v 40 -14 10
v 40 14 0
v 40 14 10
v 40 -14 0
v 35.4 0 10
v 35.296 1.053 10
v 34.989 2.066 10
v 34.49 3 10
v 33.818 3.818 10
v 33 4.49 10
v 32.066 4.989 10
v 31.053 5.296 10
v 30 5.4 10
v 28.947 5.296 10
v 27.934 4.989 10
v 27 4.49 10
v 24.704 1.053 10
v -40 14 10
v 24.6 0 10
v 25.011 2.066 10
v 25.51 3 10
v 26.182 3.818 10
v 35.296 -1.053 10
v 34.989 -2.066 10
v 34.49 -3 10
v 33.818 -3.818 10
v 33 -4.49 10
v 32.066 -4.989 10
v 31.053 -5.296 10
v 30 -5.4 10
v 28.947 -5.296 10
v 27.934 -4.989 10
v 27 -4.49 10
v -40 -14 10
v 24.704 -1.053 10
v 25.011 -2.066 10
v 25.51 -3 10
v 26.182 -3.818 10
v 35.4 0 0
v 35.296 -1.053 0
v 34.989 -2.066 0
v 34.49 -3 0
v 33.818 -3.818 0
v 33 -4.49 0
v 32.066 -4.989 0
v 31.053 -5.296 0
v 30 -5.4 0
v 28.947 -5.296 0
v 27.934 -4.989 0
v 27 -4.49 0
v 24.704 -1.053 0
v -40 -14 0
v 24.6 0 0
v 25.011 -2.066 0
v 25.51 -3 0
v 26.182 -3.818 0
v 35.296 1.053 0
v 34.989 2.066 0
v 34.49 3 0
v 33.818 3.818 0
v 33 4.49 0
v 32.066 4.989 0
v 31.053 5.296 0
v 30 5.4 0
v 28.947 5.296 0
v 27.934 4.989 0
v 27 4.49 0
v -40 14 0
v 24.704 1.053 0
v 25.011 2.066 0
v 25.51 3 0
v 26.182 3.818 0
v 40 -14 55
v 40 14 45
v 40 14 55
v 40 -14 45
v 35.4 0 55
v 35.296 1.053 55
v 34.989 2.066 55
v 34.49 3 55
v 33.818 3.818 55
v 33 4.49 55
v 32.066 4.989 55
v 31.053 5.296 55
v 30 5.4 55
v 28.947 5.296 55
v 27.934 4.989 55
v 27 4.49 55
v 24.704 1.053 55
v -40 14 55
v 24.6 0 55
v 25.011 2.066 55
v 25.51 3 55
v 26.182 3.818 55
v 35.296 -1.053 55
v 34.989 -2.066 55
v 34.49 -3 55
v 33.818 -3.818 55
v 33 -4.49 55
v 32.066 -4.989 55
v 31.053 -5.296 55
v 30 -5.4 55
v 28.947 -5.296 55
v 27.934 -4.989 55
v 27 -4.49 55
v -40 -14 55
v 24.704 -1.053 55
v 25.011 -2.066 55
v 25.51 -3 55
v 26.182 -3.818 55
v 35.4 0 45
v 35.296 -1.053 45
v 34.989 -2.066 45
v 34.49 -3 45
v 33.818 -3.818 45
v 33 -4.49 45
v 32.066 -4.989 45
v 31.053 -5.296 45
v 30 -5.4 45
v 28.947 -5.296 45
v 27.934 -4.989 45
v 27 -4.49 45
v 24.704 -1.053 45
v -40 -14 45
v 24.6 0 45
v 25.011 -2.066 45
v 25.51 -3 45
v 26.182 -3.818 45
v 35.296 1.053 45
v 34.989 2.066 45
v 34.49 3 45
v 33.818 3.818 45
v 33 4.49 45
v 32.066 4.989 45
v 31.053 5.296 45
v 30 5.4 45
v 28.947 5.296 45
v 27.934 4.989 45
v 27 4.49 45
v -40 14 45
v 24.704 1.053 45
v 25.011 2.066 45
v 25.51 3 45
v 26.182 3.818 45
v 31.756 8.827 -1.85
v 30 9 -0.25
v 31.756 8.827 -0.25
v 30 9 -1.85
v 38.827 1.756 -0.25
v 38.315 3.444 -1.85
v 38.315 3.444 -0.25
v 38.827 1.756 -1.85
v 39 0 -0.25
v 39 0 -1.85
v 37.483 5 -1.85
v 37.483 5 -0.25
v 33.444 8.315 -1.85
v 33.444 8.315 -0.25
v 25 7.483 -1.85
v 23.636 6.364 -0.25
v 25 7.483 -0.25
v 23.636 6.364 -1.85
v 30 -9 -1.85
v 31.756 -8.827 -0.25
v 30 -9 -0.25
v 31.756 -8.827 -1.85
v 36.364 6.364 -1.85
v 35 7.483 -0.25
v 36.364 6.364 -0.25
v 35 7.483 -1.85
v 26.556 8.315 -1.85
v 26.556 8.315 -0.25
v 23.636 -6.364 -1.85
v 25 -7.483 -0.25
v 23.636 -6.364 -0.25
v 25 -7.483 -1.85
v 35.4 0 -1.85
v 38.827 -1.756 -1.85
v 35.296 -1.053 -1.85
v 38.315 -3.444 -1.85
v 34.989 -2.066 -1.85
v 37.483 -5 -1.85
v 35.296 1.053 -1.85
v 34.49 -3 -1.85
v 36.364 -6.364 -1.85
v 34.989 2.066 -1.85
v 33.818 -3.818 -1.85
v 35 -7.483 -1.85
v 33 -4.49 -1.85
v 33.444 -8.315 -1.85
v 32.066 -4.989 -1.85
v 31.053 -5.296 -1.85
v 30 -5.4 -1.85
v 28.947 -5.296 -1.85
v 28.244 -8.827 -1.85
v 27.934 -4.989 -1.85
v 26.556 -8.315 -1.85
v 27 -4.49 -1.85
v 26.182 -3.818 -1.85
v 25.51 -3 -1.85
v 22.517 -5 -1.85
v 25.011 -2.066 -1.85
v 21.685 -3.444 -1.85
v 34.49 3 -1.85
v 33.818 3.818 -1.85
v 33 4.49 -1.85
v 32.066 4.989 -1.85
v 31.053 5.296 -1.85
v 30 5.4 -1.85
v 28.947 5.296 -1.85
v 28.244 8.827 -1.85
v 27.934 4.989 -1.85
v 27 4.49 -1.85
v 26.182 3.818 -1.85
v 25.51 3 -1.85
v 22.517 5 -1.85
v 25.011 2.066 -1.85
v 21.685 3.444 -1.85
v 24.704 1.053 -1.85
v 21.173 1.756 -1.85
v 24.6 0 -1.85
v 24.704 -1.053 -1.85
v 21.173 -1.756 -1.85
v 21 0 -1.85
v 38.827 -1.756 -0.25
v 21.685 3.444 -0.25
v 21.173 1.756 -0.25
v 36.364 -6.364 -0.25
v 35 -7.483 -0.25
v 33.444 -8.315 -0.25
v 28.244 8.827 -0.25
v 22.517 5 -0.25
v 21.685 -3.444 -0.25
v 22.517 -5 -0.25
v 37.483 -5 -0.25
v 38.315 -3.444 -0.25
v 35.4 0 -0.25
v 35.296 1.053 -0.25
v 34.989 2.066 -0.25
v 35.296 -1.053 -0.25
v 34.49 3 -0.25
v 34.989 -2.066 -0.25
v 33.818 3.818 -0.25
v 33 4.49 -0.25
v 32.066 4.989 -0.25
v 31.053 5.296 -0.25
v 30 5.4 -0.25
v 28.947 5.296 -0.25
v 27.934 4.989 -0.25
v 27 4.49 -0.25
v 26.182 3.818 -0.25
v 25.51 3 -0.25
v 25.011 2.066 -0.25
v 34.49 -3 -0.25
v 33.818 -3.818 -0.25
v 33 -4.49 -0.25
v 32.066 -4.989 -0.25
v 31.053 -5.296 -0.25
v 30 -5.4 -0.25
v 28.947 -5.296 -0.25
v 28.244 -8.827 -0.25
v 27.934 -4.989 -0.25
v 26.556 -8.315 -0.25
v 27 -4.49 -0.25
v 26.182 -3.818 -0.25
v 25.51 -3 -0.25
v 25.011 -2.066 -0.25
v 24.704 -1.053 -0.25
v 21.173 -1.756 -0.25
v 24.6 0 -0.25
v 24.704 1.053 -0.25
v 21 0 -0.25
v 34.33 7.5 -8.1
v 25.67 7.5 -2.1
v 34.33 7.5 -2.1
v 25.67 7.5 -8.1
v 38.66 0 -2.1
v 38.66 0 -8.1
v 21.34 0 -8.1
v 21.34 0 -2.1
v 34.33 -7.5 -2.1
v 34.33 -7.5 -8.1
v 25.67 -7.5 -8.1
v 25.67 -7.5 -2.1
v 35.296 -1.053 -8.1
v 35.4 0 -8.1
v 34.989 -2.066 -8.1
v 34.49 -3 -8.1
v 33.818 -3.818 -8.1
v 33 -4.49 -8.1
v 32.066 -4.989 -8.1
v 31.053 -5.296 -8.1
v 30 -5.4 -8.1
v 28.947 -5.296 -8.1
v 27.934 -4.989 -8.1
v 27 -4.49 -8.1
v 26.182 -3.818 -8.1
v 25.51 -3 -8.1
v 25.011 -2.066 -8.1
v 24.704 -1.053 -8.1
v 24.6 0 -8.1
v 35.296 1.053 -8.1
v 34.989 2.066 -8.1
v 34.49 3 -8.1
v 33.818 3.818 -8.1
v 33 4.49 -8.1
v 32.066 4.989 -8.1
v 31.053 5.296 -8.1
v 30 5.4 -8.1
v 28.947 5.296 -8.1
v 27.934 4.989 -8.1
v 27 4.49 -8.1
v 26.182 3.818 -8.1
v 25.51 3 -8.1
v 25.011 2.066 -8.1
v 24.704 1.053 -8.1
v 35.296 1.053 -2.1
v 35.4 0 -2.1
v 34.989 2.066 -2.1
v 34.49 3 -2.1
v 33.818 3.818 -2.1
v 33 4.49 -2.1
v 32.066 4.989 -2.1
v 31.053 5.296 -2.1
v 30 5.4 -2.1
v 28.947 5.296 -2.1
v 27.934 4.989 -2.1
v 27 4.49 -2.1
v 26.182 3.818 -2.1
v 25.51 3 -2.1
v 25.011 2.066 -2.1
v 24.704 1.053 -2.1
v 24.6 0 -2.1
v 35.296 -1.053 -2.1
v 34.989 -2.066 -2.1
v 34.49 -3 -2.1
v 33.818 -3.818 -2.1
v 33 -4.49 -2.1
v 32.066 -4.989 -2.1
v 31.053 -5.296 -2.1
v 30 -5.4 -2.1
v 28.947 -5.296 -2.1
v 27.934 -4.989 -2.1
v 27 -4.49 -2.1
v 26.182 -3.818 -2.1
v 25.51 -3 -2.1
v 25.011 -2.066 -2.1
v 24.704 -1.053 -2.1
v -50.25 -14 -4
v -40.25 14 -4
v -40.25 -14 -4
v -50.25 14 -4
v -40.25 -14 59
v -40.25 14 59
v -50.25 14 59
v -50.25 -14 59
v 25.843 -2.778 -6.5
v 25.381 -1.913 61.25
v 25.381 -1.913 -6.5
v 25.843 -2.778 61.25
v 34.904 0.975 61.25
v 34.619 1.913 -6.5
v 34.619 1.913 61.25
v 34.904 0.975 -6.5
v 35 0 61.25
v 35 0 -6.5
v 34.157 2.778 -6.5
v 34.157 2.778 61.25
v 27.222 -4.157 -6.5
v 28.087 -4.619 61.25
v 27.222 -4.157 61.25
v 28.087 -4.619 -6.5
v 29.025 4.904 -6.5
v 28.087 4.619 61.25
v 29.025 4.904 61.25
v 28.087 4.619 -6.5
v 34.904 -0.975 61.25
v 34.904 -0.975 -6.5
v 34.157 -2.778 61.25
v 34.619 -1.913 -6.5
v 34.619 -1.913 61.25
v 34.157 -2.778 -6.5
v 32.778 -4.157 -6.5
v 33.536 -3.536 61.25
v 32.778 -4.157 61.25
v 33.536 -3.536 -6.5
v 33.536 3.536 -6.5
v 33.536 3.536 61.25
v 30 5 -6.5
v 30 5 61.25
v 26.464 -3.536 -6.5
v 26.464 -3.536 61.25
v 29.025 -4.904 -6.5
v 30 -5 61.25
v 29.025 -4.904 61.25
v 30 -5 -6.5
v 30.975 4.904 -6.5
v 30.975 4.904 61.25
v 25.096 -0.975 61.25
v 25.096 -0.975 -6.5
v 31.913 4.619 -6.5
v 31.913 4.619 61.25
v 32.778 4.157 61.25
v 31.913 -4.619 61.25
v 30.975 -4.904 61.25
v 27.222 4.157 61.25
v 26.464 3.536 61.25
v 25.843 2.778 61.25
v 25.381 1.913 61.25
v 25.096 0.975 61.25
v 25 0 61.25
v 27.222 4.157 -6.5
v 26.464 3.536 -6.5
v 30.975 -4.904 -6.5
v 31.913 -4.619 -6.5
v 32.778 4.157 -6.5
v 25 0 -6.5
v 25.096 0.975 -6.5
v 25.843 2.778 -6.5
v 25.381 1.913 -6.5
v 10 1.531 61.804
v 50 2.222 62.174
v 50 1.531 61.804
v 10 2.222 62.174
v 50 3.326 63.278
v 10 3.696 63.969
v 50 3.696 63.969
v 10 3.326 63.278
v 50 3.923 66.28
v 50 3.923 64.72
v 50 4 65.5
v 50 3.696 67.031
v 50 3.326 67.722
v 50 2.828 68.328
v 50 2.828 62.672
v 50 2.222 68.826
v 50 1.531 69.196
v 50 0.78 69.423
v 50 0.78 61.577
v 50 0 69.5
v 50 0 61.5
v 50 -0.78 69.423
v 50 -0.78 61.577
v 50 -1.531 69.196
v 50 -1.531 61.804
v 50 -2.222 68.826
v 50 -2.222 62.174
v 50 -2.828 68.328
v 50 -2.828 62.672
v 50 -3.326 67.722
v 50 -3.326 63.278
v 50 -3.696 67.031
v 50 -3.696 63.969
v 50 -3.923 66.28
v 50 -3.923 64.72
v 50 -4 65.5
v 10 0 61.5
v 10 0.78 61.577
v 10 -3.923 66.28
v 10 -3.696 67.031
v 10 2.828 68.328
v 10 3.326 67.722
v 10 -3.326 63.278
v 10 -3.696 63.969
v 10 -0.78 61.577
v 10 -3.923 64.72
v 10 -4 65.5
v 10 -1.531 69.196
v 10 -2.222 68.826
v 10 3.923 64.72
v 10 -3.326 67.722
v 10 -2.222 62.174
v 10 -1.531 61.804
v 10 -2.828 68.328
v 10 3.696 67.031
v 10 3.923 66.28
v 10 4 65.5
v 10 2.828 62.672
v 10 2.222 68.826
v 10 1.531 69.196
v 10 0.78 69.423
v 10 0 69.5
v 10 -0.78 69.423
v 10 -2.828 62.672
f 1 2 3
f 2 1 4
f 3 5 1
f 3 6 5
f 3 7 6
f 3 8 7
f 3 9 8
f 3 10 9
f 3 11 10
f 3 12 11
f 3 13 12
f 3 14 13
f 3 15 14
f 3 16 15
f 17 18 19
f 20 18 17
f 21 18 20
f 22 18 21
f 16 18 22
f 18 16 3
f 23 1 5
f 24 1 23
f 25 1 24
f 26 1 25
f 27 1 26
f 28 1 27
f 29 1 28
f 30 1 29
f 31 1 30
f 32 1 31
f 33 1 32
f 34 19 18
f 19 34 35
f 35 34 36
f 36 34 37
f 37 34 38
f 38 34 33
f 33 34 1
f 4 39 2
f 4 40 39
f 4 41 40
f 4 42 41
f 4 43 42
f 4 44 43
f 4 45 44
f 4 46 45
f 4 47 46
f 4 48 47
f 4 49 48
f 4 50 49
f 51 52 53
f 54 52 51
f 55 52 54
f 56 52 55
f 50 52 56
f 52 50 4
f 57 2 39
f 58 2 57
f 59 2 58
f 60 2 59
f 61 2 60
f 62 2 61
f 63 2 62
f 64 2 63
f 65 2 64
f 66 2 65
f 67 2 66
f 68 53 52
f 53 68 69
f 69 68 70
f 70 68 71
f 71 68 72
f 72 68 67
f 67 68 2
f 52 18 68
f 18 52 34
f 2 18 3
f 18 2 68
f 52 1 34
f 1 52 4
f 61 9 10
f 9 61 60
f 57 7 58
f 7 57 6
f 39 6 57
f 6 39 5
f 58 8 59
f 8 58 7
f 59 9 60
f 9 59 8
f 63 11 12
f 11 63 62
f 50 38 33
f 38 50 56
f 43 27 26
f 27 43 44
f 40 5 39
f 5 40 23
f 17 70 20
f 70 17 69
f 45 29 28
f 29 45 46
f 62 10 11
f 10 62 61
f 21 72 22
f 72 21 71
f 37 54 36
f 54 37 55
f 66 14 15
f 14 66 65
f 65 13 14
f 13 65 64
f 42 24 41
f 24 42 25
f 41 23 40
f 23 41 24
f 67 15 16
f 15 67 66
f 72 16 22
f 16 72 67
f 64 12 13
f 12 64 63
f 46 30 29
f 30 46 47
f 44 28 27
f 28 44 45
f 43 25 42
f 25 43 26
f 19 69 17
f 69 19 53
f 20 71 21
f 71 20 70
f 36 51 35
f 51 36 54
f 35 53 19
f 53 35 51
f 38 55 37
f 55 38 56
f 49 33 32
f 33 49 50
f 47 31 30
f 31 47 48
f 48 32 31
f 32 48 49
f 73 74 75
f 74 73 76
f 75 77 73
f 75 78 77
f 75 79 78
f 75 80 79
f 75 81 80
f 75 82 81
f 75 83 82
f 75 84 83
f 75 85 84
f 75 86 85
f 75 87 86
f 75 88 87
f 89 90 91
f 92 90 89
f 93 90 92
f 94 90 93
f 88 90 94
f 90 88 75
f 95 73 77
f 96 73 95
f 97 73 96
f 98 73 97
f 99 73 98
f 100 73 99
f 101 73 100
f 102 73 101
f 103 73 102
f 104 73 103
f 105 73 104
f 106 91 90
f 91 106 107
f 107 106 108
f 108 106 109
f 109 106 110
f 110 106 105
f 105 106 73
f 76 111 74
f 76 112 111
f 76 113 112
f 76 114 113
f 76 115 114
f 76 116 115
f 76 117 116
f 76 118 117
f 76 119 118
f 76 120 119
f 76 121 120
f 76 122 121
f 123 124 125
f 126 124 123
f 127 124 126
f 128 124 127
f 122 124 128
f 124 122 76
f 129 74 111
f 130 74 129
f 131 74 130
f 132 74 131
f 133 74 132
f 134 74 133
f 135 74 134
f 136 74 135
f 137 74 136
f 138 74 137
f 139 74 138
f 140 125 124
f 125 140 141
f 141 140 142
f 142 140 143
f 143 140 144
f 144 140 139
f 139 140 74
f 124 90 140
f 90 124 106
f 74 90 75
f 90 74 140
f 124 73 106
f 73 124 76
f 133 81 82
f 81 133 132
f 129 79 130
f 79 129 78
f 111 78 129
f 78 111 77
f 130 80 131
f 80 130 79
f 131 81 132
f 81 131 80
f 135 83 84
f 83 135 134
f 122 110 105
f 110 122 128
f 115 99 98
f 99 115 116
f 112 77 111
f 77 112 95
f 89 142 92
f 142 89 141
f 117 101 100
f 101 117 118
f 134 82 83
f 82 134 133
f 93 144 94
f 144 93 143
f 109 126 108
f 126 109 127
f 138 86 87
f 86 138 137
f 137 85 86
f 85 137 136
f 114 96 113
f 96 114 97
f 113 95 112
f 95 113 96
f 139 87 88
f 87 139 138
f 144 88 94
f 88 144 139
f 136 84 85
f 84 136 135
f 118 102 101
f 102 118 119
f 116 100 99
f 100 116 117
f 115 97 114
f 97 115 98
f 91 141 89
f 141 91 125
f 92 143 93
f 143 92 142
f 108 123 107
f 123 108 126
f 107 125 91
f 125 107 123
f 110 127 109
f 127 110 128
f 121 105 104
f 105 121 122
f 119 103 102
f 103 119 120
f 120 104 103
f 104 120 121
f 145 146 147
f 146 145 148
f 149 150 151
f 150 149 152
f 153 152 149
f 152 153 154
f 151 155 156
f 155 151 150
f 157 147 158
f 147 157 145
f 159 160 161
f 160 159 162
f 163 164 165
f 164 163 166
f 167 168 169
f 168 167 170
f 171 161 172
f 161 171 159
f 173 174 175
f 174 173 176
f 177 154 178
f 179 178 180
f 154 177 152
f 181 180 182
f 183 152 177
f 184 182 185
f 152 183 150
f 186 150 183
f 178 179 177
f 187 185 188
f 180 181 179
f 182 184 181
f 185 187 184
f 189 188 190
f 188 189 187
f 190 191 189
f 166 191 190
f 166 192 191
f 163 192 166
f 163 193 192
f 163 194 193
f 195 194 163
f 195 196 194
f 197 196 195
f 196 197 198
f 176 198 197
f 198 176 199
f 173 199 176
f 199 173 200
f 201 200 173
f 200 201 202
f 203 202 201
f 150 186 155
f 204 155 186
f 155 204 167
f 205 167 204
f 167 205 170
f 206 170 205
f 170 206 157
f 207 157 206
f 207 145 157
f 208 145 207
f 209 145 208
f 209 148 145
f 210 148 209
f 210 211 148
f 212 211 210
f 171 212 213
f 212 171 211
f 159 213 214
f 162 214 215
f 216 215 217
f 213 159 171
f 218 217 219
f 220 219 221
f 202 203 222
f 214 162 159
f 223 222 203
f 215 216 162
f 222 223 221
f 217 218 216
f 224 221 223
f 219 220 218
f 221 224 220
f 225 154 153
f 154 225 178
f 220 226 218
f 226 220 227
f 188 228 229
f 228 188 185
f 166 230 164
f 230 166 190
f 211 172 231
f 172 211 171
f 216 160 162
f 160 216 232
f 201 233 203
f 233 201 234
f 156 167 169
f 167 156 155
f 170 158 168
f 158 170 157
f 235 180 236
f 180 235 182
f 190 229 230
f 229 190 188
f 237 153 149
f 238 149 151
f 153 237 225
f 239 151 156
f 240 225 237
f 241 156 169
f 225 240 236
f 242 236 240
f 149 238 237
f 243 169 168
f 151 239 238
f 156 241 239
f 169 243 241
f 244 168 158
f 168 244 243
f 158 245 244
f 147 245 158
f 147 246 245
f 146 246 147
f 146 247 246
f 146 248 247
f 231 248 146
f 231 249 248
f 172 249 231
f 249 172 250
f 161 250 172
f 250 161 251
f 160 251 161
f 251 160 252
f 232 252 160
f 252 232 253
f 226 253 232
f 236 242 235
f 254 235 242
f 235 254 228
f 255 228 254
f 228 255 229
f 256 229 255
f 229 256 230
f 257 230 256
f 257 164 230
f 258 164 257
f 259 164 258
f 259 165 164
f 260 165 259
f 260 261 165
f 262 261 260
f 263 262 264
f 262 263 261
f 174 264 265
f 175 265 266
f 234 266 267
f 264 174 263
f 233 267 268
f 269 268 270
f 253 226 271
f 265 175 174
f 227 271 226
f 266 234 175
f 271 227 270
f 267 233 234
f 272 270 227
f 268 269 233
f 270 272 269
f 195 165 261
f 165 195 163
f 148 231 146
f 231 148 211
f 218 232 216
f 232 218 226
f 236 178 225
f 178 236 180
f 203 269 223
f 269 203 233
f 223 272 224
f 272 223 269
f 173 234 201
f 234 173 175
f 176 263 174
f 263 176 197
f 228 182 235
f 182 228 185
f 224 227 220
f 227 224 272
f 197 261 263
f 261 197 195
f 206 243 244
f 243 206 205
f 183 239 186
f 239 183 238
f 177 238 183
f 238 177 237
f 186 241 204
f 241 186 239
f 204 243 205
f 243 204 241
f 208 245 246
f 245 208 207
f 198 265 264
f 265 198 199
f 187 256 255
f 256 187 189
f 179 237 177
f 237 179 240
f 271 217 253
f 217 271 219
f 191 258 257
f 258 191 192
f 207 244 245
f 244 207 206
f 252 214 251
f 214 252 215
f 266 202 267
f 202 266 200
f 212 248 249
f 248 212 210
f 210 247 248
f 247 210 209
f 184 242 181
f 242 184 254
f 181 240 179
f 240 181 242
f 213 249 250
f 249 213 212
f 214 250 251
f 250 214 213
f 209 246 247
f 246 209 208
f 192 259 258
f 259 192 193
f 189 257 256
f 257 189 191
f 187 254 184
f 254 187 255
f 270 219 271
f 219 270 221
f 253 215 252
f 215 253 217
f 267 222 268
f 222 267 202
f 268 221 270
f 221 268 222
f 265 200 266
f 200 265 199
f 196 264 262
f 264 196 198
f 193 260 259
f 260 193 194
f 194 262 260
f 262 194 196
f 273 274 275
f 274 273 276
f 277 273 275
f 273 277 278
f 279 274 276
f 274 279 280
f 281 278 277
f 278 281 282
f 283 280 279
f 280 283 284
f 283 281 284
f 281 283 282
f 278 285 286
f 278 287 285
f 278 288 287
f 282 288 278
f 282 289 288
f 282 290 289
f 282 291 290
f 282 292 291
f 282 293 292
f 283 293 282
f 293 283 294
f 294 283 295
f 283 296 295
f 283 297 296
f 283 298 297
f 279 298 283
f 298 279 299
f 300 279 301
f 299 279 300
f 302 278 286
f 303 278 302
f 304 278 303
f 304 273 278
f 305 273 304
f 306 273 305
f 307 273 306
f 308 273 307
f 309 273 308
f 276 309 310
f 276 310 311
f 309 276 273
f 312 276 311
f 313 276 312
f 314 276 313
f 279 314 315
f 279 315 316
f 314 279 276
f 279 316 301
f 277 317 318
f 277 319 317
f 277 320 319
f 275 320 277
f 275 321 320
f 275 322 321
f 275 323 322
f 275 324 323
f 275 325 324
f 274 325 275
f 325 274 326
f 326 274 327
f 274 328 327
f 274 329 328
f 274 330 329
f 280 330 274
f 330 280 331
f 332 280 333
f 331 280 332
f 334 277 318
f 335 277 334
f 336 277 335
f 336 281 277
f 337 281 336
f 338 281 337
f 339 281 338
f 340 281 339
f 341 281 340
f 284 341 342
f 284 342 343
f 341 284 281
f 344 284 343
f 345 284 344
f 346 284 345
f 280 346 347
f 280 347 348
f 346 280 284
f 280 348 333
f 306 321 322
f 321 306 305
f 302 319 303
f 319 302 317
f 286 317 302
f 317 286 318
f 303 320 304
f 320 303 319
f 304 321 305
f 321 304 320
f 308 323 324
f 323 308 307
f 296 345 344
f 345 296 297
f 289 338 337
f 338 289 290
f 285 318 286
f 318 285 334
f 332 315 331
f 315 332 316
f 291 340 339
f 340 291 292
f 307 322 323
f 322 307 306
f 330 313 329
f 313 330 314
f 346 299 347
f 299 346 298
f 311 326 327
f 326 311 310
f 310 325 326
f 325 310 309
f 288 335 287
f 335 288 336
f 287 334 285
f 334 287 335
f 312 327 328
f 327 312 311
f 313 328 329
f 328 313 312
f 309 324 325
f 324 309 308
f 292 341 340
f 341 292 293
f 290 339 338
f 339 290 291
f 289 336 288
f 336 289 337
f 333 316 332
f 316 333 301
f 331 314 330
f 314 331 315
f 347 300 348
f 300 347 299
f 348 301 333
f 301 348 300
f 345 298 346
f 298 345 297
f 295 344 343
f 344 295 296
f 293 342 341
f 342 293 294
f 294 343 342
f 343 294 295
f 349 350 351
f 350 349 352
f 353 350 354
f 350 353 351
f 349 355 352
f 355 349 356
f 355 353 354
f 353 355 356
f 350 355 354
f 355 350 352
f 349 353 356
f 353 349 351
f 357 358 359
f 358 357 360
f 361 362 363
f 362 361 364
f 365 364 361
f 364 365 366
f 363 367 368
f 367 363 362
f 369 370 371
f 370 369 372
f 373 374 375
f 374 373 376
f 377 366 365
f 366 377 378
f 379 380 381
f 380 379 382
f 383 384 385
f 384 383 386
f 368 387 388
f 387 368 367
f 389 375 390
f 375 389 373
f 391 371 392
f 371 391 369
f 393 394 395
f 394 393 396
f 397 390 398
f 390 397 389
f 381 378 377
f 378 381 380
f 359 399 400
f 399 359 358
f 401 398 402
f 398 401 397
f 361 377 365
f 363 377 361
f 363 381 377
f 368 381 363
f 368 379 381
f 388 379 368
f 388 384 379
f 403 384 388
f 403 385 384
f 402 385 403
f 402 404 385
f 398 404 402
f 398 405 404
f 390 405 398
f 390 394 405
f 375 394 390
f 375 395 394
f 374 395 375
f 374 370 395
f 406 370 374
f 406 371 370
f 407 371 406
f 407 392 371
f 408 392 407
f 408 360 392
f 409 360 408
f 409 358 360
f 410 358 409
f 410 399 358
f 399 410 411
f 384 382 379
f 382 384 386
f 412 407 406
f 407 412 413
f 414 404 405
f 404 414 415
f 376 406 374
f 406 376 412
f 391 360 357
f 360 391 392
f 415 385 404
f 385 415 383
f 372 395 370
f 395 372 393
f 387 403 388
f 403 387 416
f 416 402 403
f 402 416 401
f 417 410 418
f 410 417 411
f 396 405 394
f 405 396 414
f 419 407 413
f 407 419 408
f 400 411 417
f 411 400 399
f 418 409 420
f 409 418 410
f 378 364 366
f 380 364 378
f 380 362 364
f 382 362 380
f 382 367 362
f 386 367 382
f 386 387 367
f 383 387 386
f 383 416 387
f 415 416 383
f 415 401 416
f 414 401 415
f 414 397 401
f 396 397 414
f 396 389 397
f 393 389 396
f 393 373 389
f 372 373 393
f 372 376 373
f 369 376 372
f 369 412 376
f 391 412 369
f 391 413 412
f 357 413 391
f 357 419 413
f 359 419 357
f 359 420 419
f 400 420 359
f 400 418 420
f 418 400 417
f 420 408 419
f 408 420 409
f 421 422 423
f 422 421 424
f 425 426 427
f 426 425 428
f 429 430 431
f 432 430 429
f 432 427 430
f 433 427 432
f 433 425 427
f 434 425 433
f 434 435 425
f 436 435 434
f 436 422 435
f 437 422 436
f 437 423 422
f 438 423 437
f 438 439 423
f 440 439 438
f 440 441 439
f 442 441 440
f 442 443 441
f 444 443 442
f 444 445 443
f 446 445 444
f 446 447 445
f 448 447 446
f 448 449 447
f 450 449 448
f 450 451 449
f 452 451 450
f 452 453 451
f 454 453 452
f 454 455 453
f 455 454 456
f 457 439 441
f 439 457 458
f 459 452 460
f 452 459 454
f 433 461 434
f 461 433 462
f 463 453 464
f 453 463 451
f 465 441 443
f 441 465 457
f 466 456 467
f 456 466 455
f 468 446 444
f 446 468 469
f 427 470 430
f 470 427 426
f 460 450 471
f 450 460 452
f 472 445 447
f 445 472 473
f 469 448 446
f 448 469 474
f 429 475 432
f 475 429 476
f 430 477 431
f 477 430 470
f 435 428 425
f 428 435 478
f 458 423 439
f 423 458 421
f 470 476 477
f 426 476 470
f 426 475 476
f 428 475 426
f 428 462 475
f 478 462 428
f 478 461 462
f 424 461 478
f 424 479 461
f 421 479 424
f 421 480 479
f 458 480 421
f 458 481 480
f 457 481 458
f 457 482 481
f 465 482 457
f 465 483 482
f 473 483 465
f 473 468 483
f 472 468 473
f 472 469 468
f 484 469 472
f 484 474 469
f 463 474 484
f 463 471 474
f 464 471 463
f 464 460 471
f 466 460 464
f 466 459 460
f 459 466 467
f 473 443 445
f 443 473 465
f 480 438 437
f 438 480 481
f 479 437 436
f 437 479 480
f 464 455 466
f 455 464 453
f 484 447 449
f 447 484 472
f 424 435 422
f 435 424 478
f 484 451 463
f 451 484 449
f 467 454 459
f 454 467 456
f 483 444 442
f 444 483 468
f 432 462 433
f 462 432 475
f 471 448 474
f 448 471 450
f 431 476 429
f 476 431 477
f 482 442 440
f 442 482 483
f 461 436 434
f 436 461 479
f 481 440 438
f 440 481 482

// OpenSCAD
$fn = 32;

// ------------------------------------------------------------------------
// C clamp: throat 45 mm, screw d10
// Every part is its own module, assembly() places every instance.
// ------------------------------------------------------------------------

// --- part 1 ---
module clamp_arm() {
  difference() {
    translate([-40, -14, 0]) cube([80, 28, 10]);
    translate([30, 0, -1]) cylinder(h = 12, d = 10.8);
  }
}

// --- part 2 ---
module clamp_spine() {
  difference() {
    translate([-31.5, -14, 0]) cube([63, 28, 10]);
  }
}

// --- part 3 ---
module clamp_screw() {
  translate([0, 0, -33.875]) cylinder(h = 67.75, d = 10);
}

// --- part 4 ---
module clamp_washer() {
  difference() {
      translate([0, 0, 0]) cylinder(h = 1.6, d = 18);
      translate([0, 0, -1]) cylinder(h = 3.6, d = 10.8);
    }
}

// --- part 5 ---
module clamp_nut() {
  difference() {
    linear_extrude(height = 6) polygon(points = [[8.66, 0], [4.33, 7.5], [-4.33, 7.5], [-8.66, 0], [-4.33, -7.5], [4.33, -7.5]]);
    translate([0, 0, -1]) cylinder(h = 8, d = 10.8);
  }
}

// --- part 6 ---
module tommy_bar() {
  translate([0, 0, -20]) cylinder(h = 40, d = 8);
}

// --- assembly ---
module assembly() {
  color([0.80, 0.24, 0.20]) translate([0, 0, 0]) rotate([0, 0, 0]) clamp_arm();
  color([0.20, 0.45, 0.75]) translate([0, 0, 45]) rotate([0, 0, 0]) clamp_arm();
  color([0.25, 0.62, 0.32]) translate([-50.25, 0, 27.5]) rotate([0, 90, 0]) clamp_spine();
  color([0.92, 0.70, 0.18]) translate([30, 0, 27.375]) rotate([0, 0, 0]) clamp_screw();
  color([0.58, 0.35, 0.70]) translate([30, 0, -1.85]) rotate([0, 0, 0]) clamp_washer();
  color([0.16, 0.66, 0.66]) translate([30, 0, -8.1]) rotate([0, 0, 0]) clamp_nut();
  color([0.85, 0.48, 0.18]) translate([30, 0, 65.5]) rotate([0, 90, 0]) tommy_bar();
}

assembly();
